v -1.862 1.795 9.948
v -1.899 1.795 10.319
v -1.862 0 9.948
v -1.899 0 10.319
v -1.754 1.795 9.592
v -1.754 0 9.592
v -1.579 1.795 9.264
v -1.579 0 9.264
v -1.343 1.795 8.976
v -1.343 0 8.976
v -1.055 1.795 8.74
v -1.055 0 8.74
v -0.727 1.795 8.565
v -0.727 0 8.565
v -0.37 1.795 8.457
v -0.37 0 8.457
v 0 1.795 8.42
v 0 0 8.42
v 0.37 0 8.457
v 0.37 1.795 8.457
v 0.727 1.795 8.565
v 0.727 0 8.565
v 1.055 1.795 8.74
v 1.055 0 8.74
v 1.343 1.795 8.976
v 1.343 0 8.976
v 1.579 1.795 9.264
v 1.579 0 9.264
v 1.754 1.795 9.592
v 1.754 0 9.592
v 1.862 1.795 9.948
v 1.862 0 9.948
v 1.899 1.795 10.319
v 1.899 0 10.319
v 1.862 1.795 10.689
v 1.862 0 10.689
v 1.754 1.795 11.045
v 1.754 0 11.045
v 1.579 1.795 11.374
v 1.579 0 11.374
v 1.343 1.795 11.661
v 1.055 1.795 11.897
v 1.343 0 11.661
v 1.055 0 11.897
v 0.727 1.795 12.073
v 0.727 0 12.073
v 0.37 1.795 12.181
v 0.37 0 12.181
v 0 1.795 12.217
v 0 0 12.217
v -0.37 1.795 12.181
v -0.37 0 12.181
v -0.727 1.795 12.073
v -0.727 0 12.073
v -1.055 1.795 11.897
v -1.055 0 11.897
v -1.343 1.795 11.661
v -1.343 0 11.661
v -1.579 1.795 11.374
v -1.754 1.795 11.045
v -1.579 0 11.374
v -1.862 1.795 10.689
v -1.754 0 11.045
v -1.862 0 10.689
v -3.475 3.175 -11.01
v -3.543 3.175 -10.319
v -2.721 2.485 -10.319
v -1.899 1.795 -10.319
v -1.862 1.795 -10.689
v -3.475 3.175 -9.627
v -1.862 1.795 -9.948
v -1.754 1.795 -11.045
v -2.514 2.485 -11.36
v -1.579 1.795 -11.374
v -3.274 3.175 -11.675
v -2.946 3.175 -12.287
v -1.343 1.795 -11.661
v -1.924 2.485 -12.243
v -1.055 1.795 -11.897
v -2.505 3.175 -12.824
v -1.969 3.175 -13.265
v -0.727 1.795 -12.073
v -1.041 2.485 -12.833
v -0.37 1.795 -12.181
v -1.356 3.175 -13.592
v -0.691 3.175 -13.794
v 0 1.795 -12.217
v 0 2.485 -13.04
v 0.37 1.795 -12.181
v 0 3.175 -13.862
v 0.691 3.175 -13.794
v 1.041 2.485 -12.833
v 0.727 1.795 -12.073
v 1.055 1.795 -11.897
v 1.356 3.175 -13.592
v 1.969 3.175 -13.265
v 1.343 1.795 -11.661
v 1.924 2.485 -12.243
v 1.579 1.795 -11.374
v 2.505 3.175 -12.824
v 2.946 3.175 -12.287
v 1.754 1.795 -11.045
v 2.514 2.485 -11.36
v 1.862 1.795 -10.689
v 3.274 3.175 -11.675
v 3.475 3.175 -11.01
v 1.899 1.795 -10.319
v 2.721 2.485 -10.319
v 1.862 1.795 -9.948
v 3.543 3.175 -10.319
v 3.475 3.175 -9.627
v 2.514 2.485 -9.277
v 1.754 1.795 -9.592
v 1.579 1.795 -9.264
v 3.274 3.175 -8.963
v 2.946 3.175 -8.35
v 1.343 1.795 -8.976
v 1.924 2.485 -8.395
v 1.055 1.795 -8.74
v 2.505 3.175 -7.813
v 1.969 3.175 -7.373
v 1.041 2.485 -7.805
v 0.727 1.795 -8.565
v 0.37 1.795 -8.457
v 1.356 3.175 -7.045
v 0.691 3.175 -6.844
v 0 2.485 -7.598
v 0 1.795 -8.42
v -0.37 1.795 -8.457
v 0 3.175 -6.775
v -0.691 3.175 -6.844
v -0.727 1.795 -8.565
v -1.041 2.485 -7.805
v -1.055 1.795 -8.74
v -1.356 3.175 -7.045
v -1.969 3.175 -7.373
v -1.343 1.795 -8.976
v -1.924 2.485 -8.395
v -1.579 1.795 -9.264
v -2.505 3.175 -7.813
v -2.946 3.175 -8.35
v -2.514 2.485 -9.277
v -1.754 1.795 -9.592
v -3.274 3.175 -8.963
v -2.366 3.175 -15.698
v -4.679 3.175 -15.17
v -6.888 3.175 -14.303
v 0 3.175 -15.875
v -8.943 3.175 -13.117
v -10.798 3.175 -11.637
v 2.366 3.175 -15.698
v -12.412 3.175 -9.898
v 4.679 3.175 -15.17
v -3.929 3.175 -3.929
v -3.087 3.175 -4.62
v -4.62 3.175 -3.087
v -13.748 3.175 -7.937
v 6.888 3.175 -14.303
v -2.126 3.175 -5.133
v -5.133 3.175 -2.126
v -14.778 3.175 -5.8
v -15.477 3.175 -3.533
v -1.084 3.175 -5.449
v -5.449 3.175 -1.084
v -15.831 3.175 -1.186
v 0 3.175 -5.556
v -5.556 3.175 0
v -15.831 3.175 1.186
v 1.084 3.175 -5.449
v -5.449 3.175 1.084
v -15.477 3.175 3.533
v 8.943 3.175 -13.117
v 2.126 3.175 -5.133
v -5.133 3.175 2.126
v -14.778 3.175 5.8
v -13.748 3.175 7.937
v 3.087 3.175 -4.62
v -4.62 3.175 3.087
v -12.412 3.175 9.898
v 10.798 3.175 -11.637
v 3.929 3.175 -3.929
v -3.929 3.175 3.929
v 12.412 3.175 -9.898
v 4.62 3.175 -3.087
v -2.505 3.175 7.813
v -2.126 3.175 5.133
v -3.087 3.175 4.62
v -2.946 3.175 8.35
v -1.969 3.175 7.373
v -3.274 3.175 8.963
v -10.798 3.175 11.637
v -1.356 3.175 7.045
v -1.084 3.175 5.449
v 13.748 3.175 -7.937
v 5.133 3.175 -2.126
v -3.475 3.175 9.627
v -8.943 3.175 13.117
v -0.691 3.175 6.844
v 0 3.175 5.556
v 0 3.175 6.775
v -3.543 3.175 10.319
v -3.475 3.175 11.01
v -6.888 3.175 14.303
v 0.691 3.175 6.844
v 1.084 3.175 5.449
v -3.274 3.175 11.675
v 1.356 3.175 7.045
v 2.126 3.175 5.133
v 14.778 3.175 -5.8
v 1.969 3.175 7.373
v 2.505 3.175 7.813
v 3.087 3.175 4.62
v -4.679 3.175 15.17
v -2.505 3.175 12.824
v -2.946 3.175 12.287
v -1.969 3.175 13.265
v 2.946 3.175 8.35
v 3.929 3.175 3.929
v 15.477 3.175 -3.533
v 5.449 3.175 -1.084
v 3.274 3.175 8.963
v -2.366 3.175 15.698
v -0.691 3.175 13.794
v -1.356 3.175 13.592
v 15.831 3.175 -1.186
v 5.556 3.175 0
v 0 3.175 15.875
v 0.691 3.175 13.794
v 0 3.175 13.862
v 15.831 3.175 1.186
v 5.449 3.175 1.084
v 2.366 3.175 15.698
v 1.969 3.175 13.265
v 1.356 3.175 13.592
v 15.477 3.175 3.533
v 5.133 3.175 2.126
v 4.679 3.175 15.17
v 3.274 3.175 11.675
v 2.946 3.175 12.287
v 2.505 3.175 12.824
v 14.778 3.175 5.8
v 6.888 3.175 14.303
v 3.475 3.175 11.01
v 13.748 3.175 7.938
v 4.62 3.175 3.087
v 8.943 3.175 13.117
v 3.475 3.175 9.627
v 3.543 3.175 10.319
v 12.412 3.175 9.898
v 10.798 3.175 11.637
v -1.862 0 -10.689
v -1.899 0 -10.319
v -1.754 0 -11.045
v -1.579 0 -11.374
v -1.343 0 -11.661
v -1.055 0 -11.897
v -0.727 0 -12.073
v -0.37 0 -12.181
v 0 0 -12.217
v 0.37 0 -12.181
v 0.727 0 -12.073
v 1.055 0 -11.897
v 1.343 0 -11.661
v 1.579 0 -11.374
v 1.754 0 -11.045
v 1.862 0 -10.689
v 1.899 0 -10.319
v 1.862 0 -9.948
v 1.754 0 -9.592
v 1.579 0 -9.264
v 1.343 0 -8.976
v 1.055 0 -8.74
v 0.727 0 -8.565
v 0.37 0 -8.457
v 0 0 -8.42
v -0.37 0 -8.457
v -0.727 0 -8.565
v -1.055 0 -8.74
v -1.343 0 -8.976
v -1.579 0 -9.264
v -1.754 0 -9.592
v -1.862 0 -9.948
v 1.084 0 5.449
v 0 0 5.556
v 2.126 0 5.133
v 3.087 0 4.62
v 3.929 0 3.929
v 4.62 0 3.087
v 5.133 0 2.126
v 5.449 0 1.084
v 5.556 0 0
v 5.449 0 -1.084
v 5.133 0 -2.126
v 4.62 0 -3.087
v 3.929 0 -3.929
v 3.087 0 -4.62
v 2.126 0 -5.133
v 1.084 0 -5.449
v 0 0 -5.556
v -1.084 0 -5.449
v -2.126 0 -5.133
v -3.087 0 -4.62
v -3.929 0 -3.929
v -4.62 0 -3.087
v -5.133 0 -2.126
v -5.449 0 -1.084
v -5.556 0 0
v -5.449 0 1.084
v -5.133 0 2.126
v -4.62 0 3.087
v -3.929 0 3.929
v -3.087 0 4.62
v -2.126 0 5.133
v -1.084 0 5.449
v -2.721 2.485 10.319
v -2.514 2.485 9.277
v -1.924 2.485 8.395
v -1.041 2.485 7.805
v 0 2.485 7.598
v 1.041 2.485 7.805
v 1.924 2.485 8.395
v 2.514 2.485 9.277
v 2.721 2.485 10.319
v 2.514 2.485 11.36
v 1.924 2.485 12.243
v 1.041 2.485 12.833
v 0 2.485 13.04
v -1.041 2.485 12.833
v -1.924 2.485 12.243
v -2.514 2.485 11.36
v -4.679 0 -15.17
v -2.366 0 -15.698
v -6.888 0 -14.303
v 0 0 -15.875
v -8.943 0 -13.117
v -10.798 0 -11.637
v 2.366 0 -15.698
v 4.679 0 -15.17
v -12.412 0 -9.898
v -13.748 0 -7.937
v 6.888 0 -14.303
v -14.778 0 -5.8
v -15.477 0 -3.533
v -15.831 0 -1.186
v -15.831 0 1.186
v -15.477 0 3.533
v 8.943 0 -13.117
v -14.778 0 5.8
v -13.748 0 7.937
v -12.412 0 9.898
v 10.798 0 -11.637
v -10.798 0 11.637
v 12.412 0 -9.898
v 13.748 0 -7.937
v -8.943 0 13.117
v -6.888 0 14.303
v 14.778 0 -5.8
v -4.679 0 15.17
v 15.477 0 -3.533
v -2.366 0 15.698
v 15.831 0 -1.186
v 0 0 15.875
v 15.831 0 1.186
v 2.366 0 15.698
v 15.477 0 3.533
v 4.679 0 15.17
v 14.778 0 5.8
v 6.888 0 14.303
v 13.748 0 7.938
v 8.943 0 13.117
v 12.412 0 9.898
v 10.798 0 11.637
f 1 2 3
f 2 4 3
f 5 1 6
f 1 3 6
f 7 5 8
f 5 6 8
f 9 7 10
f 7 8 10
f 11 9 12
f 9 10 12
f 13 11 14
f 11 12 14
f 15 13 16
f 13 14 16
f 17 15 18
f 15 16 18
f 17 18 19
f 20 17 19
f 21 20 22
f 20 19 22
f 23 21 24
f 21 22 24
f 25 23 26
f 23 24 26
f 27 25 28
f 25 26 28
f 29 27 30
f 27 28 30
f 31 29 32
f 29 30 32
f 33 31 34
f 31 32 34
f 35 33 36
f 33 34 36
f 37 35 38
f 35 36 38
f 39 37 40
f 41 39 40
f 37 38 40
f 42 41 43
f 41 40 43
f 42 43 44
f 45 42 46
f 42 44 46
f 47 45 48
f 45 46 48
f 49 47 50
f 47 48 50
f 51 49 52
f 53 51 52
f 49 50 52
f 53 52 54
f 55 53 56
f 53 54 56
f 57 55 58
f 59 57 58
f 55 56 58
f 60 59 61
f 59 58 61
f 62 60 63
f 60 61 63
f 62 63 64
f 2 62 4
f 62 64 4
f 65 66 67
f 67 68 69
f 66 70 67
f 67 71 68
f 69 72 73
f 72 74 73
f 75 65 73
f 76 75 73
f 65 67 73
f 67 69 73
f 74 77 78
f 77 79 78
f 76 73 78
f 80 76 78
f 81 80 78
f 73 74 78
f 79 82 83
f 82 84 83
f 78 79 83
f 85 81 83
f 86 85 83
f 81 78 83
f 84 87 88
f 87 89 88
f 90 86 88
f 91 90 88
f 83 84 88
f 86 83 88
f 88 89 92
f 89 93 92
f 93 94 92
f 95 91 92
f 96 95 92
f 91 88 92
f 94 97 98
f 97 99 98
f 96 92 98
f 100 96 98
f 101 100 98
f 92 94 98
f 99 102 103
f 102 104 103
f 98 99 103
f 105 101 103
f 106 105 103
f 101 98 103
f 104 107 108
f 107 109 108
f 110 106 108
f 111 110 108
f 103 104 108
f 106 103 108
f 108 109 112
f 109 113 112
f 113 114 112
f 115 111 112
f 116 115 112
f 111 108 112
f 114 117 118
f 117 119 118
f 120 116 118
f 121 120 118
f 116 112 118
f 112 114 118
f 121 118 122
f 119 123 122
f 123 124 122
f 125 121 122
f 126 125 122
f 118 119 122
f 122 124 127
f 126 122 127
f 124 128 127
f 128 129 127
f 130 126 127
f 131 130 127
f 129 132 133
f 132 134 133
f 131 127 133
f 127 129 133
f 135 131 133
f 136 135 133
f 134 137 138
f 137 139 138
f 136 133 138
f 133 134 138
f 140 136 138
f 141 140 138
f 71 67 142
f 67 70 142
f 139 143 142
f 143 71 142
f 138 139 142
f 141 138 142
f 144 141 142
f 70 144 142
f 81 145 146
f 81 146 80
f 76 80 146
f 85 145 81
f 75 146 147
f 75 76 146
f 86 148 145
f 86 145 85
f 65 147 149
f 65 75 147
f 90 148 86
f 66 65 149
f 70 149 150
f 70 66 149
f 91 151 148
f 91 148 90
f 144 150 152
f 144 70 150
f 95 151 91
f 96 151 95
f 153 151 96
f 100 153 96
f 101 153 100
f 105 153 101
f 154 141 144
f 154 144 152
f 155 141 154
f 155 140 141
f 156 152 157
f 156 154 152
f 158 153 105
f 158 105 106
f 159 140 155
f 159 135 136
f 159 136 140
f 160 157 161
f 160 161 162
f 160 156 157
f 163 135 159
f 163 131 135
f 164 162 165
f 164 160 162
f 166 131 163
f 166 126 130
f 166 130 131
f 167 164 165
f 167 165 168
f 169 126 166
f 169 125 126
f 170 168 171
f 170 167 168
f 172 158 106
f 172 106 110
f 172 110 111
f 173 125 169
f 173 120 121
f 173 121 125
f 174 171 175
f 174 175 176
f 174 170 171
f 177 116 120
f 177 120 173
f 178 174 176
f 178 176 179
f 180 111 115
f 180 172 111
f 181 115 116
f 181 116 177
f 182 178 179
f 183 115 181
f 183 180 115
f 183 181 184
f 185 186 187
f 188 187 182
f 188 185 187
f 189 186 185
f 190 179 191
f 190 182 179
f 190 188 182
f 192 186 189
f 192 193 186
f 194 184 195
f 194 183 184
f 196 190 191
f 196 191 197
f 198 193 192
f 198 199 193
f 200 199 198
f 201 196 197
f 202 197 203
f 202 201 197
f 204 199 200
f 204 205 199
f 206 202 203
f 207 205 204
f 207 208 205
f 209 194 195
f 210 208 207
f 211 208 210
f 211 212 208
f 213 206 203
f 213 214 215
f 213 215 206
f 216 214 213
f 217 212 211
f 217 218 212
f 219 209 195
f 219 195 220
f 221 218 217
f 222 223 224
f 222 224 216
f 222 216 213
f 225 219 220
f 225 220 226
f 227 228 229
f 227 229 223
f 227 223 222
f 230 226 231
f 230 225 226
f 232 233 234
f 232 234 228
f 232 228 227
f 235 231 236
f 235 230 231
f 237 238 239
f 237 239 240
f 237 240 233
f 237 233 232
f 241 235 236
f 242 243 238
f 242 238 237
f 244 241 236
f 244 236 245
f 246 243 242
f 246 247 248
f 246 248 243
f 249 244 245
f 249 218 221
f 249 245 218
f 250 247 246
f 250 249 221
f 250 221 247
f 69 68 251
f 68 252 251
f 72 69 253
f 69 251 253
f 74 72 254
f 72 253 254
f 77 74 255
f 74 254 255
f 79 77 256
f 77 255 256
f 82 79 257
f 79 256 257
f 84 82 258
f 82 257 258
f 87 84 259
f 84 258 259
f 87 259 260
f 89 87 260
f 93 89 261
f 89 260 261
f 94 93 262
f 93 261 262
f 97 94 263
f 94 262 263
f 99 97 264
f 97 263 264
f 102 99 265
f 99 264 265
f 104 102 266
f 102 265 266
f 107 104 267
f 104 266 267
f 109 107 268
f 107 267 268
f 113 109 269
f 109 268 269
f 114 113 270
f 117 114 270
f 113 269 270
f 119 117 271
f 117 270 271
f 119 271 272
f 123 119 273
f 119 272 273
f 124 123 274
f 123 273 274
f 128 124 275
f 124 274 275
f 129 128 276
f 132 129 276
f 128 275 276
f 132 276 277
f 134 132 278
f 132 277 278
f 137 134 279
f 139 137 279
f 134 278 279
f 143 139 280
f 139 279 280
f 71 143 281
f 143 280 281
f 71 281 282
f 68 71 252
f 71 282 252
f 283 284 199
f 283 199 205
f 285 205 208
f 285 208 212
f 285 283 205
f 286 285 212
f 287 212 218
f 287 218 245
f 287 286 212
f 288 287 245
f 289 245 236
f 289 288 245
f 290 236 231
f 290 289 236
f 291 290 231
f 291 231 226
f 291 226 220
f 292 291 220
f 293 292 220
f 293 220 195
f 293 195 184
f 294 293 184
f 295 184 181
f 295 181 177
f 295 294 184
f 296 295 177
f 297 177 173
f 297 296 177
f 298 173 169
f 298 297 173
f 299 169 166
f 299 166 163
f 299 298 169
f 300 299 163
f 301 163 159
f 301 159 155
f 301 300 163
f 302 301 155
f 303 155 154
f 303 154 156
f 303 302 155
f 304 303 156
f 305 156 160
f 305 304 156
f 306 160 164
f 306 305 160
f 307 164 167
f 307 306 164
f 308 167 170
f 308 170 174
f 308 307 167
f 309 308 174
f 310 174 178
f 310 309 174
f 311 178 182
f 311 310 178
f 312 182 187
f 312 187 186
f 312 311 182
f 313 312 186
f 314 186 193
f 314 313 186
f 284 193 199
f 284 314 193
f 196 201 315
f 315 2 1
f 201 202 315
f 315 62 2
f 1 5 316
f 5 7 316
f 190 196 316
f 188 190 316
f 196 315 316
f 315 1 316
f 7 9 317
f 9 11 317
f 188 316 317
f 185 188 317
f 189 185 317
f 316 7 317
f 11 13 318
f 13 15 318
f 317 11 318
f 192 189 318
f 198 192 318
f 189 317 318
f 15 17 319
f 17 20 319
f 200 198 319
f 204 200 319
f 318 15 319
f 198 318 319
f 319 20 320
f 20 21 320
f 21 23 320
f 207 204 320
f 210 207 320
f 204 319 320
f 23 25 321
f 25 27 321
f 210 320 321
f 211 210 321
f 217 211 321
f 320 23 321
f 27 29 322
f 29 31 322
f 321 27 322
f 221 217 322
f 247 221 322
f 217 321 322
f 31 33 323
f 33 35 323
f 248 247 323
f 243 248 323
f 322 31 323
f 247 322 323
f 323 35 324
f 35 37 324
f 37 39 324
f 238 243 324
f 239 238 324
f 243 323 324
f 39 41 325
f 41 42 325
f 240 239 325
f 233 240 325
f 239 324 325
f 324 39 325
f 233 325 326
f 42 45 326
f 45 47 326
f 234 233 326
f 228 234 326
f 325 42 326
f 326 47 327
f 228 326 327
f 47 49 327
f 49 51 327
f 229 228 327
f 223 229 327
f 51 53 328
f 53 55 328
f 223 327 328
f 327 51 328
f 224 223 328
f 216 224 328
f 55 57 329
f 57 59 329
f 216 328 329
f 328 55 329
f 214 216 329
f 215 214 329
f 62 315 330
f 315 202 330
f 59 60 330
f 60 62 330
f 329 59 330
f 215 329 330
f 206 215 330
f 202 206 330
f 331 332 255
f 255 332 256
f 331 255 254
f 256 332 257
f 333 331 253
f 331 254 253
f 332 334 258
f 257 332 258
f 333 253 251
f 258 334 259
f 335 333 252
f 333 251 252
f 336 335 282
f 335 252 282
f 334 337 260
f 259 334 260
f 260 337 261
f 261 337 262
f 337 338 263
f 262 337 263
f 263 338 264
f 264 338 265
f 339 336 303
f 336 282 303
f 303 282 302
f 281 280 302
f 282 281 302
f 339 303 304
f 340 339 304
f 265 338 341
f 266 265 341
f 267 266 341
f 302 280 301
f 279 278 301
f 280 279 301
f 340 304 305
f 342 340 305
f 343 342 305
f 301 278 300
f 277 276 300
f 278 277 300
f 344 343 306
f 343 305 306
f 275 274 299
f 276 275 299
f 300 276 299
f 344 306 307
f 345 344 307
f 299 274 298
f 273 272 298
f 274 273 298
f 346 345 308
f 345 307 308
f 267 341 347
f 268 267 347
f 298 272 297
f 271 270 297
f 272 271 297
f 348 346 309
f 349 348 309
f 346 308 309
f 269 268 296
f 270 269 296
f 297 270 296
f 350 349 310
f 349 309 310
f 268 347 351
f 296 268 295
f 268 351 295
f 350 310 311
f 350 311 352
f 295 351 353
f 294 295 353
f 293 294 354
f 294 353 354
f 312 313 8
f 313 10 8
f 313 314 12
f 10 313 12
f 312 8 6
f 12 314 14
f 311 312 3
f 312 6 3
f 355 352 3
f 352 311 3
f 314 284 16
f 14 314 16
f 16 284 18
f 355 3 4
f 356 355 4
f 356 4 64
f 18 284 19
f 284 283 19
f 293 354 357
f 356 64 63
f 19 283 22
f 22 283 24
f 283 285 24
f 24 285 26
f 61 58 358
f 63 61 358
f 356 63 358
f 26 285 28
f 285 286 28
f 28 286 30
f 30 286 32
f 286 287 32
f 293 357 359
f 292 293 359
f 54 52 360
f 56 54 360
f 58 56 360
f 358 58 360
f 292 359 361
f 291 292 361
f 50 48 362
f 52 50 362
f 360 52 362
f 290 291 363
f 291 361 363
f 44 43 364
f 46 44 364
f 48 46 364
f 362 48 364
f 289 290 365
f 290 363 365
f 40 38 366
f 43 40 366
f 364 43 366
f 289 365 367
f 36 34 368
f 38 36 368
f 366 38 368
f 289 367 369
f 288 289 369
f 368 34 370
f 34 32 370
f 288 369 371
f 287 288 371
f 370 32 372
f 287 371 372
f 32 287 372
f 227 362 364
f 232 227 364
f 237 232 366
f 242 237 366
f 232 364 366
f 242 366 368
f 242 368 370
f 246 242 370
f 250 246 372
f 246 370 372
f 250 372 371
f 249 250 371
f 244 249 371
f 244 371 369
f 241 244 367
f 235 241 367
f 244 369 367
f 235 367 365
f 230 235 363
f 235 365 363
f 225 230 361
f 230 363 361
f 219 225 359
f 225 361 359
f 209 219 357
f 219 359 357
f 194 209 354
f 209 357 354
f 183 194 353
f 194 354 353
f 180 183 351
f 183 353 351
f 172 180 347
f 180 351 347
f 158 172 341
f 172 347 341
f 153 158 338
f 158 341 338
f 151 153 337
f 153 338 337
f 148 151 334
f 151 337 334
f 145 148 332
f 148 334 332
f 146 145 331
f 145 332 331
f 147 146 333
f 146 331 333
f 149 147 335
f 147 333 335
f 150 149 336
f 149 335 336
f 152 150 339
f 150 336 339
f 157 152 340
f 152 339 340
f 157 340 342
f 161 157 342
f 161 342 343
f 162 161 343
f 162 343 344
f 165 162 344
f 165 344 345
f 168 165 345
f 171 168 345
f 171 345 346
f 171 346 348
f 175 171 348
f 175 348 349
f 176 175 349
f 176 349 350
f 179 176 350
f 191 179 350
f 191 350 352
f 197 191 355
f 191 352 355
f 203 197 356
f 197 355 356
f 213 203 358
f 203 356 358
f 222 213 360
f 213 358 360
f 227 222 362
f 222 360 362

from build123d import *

# Parameters (mm, degrees)
SKETCH1_R                                         = 15.875
SKETCH1_R_2                                       = 5.55625
BOSS_EXTRUDE1_DEPTH                               = 3.175
CSK_FOR_6_FLAT_HEAD_MACHINE_SCREW_100_D           = 3.7973
CSK_FOR_6_FLAT_HEAD_MACHINE_SCREW_100_CSINK_D     = 7.0866
CSK_FOR_6_FLAT_HEAD_MACHINE_SCREW_100_CSINK_ANGLE = 100


with BuildPart() as part:
    # Sketch1 → Boss-Extrude1 (new body)
    with BuildSketch(Plane(origin=(0, 0, 0), x_dir=(1, 0, 0), z_dir=(0, 1, 0))):
        with Locations(Location((0, 0, 0), (0, 0, 270))):
            Circle(SKETCH1_R)
        with Locations(Location((0, 0, 0), (0, 0, 270))):
            Circle(SKETCH1_R_2, mode=Mode.SUBTRACT)
    extrude(amount=BOSS_EXTRUDE1_DEPTH)

    # CSK for #6 Flat Head Machine Screw (100)1 (through all)
    with Locations(Plane(origin=(0, 3.175, 0), x_dir=(1, 0, 0), z_dir=(0, 1, 0))):
        with Locations((0, -10.31875), (0, 10.31875)):
            CounterSinkHole(CSK_FOR_6_FLAT_HEAD_MACHINE_SCREW_100_D / 2, CSK_FOR_6_FLAT_HEAD_MACHINE_SCREW_100_CSINK_D / 2, counter_sink_angle=CSK_FOR_6_FLAT_HEAD_MACHINE_SCREW_100_CSINK_ANGLE)


solid = part.part
